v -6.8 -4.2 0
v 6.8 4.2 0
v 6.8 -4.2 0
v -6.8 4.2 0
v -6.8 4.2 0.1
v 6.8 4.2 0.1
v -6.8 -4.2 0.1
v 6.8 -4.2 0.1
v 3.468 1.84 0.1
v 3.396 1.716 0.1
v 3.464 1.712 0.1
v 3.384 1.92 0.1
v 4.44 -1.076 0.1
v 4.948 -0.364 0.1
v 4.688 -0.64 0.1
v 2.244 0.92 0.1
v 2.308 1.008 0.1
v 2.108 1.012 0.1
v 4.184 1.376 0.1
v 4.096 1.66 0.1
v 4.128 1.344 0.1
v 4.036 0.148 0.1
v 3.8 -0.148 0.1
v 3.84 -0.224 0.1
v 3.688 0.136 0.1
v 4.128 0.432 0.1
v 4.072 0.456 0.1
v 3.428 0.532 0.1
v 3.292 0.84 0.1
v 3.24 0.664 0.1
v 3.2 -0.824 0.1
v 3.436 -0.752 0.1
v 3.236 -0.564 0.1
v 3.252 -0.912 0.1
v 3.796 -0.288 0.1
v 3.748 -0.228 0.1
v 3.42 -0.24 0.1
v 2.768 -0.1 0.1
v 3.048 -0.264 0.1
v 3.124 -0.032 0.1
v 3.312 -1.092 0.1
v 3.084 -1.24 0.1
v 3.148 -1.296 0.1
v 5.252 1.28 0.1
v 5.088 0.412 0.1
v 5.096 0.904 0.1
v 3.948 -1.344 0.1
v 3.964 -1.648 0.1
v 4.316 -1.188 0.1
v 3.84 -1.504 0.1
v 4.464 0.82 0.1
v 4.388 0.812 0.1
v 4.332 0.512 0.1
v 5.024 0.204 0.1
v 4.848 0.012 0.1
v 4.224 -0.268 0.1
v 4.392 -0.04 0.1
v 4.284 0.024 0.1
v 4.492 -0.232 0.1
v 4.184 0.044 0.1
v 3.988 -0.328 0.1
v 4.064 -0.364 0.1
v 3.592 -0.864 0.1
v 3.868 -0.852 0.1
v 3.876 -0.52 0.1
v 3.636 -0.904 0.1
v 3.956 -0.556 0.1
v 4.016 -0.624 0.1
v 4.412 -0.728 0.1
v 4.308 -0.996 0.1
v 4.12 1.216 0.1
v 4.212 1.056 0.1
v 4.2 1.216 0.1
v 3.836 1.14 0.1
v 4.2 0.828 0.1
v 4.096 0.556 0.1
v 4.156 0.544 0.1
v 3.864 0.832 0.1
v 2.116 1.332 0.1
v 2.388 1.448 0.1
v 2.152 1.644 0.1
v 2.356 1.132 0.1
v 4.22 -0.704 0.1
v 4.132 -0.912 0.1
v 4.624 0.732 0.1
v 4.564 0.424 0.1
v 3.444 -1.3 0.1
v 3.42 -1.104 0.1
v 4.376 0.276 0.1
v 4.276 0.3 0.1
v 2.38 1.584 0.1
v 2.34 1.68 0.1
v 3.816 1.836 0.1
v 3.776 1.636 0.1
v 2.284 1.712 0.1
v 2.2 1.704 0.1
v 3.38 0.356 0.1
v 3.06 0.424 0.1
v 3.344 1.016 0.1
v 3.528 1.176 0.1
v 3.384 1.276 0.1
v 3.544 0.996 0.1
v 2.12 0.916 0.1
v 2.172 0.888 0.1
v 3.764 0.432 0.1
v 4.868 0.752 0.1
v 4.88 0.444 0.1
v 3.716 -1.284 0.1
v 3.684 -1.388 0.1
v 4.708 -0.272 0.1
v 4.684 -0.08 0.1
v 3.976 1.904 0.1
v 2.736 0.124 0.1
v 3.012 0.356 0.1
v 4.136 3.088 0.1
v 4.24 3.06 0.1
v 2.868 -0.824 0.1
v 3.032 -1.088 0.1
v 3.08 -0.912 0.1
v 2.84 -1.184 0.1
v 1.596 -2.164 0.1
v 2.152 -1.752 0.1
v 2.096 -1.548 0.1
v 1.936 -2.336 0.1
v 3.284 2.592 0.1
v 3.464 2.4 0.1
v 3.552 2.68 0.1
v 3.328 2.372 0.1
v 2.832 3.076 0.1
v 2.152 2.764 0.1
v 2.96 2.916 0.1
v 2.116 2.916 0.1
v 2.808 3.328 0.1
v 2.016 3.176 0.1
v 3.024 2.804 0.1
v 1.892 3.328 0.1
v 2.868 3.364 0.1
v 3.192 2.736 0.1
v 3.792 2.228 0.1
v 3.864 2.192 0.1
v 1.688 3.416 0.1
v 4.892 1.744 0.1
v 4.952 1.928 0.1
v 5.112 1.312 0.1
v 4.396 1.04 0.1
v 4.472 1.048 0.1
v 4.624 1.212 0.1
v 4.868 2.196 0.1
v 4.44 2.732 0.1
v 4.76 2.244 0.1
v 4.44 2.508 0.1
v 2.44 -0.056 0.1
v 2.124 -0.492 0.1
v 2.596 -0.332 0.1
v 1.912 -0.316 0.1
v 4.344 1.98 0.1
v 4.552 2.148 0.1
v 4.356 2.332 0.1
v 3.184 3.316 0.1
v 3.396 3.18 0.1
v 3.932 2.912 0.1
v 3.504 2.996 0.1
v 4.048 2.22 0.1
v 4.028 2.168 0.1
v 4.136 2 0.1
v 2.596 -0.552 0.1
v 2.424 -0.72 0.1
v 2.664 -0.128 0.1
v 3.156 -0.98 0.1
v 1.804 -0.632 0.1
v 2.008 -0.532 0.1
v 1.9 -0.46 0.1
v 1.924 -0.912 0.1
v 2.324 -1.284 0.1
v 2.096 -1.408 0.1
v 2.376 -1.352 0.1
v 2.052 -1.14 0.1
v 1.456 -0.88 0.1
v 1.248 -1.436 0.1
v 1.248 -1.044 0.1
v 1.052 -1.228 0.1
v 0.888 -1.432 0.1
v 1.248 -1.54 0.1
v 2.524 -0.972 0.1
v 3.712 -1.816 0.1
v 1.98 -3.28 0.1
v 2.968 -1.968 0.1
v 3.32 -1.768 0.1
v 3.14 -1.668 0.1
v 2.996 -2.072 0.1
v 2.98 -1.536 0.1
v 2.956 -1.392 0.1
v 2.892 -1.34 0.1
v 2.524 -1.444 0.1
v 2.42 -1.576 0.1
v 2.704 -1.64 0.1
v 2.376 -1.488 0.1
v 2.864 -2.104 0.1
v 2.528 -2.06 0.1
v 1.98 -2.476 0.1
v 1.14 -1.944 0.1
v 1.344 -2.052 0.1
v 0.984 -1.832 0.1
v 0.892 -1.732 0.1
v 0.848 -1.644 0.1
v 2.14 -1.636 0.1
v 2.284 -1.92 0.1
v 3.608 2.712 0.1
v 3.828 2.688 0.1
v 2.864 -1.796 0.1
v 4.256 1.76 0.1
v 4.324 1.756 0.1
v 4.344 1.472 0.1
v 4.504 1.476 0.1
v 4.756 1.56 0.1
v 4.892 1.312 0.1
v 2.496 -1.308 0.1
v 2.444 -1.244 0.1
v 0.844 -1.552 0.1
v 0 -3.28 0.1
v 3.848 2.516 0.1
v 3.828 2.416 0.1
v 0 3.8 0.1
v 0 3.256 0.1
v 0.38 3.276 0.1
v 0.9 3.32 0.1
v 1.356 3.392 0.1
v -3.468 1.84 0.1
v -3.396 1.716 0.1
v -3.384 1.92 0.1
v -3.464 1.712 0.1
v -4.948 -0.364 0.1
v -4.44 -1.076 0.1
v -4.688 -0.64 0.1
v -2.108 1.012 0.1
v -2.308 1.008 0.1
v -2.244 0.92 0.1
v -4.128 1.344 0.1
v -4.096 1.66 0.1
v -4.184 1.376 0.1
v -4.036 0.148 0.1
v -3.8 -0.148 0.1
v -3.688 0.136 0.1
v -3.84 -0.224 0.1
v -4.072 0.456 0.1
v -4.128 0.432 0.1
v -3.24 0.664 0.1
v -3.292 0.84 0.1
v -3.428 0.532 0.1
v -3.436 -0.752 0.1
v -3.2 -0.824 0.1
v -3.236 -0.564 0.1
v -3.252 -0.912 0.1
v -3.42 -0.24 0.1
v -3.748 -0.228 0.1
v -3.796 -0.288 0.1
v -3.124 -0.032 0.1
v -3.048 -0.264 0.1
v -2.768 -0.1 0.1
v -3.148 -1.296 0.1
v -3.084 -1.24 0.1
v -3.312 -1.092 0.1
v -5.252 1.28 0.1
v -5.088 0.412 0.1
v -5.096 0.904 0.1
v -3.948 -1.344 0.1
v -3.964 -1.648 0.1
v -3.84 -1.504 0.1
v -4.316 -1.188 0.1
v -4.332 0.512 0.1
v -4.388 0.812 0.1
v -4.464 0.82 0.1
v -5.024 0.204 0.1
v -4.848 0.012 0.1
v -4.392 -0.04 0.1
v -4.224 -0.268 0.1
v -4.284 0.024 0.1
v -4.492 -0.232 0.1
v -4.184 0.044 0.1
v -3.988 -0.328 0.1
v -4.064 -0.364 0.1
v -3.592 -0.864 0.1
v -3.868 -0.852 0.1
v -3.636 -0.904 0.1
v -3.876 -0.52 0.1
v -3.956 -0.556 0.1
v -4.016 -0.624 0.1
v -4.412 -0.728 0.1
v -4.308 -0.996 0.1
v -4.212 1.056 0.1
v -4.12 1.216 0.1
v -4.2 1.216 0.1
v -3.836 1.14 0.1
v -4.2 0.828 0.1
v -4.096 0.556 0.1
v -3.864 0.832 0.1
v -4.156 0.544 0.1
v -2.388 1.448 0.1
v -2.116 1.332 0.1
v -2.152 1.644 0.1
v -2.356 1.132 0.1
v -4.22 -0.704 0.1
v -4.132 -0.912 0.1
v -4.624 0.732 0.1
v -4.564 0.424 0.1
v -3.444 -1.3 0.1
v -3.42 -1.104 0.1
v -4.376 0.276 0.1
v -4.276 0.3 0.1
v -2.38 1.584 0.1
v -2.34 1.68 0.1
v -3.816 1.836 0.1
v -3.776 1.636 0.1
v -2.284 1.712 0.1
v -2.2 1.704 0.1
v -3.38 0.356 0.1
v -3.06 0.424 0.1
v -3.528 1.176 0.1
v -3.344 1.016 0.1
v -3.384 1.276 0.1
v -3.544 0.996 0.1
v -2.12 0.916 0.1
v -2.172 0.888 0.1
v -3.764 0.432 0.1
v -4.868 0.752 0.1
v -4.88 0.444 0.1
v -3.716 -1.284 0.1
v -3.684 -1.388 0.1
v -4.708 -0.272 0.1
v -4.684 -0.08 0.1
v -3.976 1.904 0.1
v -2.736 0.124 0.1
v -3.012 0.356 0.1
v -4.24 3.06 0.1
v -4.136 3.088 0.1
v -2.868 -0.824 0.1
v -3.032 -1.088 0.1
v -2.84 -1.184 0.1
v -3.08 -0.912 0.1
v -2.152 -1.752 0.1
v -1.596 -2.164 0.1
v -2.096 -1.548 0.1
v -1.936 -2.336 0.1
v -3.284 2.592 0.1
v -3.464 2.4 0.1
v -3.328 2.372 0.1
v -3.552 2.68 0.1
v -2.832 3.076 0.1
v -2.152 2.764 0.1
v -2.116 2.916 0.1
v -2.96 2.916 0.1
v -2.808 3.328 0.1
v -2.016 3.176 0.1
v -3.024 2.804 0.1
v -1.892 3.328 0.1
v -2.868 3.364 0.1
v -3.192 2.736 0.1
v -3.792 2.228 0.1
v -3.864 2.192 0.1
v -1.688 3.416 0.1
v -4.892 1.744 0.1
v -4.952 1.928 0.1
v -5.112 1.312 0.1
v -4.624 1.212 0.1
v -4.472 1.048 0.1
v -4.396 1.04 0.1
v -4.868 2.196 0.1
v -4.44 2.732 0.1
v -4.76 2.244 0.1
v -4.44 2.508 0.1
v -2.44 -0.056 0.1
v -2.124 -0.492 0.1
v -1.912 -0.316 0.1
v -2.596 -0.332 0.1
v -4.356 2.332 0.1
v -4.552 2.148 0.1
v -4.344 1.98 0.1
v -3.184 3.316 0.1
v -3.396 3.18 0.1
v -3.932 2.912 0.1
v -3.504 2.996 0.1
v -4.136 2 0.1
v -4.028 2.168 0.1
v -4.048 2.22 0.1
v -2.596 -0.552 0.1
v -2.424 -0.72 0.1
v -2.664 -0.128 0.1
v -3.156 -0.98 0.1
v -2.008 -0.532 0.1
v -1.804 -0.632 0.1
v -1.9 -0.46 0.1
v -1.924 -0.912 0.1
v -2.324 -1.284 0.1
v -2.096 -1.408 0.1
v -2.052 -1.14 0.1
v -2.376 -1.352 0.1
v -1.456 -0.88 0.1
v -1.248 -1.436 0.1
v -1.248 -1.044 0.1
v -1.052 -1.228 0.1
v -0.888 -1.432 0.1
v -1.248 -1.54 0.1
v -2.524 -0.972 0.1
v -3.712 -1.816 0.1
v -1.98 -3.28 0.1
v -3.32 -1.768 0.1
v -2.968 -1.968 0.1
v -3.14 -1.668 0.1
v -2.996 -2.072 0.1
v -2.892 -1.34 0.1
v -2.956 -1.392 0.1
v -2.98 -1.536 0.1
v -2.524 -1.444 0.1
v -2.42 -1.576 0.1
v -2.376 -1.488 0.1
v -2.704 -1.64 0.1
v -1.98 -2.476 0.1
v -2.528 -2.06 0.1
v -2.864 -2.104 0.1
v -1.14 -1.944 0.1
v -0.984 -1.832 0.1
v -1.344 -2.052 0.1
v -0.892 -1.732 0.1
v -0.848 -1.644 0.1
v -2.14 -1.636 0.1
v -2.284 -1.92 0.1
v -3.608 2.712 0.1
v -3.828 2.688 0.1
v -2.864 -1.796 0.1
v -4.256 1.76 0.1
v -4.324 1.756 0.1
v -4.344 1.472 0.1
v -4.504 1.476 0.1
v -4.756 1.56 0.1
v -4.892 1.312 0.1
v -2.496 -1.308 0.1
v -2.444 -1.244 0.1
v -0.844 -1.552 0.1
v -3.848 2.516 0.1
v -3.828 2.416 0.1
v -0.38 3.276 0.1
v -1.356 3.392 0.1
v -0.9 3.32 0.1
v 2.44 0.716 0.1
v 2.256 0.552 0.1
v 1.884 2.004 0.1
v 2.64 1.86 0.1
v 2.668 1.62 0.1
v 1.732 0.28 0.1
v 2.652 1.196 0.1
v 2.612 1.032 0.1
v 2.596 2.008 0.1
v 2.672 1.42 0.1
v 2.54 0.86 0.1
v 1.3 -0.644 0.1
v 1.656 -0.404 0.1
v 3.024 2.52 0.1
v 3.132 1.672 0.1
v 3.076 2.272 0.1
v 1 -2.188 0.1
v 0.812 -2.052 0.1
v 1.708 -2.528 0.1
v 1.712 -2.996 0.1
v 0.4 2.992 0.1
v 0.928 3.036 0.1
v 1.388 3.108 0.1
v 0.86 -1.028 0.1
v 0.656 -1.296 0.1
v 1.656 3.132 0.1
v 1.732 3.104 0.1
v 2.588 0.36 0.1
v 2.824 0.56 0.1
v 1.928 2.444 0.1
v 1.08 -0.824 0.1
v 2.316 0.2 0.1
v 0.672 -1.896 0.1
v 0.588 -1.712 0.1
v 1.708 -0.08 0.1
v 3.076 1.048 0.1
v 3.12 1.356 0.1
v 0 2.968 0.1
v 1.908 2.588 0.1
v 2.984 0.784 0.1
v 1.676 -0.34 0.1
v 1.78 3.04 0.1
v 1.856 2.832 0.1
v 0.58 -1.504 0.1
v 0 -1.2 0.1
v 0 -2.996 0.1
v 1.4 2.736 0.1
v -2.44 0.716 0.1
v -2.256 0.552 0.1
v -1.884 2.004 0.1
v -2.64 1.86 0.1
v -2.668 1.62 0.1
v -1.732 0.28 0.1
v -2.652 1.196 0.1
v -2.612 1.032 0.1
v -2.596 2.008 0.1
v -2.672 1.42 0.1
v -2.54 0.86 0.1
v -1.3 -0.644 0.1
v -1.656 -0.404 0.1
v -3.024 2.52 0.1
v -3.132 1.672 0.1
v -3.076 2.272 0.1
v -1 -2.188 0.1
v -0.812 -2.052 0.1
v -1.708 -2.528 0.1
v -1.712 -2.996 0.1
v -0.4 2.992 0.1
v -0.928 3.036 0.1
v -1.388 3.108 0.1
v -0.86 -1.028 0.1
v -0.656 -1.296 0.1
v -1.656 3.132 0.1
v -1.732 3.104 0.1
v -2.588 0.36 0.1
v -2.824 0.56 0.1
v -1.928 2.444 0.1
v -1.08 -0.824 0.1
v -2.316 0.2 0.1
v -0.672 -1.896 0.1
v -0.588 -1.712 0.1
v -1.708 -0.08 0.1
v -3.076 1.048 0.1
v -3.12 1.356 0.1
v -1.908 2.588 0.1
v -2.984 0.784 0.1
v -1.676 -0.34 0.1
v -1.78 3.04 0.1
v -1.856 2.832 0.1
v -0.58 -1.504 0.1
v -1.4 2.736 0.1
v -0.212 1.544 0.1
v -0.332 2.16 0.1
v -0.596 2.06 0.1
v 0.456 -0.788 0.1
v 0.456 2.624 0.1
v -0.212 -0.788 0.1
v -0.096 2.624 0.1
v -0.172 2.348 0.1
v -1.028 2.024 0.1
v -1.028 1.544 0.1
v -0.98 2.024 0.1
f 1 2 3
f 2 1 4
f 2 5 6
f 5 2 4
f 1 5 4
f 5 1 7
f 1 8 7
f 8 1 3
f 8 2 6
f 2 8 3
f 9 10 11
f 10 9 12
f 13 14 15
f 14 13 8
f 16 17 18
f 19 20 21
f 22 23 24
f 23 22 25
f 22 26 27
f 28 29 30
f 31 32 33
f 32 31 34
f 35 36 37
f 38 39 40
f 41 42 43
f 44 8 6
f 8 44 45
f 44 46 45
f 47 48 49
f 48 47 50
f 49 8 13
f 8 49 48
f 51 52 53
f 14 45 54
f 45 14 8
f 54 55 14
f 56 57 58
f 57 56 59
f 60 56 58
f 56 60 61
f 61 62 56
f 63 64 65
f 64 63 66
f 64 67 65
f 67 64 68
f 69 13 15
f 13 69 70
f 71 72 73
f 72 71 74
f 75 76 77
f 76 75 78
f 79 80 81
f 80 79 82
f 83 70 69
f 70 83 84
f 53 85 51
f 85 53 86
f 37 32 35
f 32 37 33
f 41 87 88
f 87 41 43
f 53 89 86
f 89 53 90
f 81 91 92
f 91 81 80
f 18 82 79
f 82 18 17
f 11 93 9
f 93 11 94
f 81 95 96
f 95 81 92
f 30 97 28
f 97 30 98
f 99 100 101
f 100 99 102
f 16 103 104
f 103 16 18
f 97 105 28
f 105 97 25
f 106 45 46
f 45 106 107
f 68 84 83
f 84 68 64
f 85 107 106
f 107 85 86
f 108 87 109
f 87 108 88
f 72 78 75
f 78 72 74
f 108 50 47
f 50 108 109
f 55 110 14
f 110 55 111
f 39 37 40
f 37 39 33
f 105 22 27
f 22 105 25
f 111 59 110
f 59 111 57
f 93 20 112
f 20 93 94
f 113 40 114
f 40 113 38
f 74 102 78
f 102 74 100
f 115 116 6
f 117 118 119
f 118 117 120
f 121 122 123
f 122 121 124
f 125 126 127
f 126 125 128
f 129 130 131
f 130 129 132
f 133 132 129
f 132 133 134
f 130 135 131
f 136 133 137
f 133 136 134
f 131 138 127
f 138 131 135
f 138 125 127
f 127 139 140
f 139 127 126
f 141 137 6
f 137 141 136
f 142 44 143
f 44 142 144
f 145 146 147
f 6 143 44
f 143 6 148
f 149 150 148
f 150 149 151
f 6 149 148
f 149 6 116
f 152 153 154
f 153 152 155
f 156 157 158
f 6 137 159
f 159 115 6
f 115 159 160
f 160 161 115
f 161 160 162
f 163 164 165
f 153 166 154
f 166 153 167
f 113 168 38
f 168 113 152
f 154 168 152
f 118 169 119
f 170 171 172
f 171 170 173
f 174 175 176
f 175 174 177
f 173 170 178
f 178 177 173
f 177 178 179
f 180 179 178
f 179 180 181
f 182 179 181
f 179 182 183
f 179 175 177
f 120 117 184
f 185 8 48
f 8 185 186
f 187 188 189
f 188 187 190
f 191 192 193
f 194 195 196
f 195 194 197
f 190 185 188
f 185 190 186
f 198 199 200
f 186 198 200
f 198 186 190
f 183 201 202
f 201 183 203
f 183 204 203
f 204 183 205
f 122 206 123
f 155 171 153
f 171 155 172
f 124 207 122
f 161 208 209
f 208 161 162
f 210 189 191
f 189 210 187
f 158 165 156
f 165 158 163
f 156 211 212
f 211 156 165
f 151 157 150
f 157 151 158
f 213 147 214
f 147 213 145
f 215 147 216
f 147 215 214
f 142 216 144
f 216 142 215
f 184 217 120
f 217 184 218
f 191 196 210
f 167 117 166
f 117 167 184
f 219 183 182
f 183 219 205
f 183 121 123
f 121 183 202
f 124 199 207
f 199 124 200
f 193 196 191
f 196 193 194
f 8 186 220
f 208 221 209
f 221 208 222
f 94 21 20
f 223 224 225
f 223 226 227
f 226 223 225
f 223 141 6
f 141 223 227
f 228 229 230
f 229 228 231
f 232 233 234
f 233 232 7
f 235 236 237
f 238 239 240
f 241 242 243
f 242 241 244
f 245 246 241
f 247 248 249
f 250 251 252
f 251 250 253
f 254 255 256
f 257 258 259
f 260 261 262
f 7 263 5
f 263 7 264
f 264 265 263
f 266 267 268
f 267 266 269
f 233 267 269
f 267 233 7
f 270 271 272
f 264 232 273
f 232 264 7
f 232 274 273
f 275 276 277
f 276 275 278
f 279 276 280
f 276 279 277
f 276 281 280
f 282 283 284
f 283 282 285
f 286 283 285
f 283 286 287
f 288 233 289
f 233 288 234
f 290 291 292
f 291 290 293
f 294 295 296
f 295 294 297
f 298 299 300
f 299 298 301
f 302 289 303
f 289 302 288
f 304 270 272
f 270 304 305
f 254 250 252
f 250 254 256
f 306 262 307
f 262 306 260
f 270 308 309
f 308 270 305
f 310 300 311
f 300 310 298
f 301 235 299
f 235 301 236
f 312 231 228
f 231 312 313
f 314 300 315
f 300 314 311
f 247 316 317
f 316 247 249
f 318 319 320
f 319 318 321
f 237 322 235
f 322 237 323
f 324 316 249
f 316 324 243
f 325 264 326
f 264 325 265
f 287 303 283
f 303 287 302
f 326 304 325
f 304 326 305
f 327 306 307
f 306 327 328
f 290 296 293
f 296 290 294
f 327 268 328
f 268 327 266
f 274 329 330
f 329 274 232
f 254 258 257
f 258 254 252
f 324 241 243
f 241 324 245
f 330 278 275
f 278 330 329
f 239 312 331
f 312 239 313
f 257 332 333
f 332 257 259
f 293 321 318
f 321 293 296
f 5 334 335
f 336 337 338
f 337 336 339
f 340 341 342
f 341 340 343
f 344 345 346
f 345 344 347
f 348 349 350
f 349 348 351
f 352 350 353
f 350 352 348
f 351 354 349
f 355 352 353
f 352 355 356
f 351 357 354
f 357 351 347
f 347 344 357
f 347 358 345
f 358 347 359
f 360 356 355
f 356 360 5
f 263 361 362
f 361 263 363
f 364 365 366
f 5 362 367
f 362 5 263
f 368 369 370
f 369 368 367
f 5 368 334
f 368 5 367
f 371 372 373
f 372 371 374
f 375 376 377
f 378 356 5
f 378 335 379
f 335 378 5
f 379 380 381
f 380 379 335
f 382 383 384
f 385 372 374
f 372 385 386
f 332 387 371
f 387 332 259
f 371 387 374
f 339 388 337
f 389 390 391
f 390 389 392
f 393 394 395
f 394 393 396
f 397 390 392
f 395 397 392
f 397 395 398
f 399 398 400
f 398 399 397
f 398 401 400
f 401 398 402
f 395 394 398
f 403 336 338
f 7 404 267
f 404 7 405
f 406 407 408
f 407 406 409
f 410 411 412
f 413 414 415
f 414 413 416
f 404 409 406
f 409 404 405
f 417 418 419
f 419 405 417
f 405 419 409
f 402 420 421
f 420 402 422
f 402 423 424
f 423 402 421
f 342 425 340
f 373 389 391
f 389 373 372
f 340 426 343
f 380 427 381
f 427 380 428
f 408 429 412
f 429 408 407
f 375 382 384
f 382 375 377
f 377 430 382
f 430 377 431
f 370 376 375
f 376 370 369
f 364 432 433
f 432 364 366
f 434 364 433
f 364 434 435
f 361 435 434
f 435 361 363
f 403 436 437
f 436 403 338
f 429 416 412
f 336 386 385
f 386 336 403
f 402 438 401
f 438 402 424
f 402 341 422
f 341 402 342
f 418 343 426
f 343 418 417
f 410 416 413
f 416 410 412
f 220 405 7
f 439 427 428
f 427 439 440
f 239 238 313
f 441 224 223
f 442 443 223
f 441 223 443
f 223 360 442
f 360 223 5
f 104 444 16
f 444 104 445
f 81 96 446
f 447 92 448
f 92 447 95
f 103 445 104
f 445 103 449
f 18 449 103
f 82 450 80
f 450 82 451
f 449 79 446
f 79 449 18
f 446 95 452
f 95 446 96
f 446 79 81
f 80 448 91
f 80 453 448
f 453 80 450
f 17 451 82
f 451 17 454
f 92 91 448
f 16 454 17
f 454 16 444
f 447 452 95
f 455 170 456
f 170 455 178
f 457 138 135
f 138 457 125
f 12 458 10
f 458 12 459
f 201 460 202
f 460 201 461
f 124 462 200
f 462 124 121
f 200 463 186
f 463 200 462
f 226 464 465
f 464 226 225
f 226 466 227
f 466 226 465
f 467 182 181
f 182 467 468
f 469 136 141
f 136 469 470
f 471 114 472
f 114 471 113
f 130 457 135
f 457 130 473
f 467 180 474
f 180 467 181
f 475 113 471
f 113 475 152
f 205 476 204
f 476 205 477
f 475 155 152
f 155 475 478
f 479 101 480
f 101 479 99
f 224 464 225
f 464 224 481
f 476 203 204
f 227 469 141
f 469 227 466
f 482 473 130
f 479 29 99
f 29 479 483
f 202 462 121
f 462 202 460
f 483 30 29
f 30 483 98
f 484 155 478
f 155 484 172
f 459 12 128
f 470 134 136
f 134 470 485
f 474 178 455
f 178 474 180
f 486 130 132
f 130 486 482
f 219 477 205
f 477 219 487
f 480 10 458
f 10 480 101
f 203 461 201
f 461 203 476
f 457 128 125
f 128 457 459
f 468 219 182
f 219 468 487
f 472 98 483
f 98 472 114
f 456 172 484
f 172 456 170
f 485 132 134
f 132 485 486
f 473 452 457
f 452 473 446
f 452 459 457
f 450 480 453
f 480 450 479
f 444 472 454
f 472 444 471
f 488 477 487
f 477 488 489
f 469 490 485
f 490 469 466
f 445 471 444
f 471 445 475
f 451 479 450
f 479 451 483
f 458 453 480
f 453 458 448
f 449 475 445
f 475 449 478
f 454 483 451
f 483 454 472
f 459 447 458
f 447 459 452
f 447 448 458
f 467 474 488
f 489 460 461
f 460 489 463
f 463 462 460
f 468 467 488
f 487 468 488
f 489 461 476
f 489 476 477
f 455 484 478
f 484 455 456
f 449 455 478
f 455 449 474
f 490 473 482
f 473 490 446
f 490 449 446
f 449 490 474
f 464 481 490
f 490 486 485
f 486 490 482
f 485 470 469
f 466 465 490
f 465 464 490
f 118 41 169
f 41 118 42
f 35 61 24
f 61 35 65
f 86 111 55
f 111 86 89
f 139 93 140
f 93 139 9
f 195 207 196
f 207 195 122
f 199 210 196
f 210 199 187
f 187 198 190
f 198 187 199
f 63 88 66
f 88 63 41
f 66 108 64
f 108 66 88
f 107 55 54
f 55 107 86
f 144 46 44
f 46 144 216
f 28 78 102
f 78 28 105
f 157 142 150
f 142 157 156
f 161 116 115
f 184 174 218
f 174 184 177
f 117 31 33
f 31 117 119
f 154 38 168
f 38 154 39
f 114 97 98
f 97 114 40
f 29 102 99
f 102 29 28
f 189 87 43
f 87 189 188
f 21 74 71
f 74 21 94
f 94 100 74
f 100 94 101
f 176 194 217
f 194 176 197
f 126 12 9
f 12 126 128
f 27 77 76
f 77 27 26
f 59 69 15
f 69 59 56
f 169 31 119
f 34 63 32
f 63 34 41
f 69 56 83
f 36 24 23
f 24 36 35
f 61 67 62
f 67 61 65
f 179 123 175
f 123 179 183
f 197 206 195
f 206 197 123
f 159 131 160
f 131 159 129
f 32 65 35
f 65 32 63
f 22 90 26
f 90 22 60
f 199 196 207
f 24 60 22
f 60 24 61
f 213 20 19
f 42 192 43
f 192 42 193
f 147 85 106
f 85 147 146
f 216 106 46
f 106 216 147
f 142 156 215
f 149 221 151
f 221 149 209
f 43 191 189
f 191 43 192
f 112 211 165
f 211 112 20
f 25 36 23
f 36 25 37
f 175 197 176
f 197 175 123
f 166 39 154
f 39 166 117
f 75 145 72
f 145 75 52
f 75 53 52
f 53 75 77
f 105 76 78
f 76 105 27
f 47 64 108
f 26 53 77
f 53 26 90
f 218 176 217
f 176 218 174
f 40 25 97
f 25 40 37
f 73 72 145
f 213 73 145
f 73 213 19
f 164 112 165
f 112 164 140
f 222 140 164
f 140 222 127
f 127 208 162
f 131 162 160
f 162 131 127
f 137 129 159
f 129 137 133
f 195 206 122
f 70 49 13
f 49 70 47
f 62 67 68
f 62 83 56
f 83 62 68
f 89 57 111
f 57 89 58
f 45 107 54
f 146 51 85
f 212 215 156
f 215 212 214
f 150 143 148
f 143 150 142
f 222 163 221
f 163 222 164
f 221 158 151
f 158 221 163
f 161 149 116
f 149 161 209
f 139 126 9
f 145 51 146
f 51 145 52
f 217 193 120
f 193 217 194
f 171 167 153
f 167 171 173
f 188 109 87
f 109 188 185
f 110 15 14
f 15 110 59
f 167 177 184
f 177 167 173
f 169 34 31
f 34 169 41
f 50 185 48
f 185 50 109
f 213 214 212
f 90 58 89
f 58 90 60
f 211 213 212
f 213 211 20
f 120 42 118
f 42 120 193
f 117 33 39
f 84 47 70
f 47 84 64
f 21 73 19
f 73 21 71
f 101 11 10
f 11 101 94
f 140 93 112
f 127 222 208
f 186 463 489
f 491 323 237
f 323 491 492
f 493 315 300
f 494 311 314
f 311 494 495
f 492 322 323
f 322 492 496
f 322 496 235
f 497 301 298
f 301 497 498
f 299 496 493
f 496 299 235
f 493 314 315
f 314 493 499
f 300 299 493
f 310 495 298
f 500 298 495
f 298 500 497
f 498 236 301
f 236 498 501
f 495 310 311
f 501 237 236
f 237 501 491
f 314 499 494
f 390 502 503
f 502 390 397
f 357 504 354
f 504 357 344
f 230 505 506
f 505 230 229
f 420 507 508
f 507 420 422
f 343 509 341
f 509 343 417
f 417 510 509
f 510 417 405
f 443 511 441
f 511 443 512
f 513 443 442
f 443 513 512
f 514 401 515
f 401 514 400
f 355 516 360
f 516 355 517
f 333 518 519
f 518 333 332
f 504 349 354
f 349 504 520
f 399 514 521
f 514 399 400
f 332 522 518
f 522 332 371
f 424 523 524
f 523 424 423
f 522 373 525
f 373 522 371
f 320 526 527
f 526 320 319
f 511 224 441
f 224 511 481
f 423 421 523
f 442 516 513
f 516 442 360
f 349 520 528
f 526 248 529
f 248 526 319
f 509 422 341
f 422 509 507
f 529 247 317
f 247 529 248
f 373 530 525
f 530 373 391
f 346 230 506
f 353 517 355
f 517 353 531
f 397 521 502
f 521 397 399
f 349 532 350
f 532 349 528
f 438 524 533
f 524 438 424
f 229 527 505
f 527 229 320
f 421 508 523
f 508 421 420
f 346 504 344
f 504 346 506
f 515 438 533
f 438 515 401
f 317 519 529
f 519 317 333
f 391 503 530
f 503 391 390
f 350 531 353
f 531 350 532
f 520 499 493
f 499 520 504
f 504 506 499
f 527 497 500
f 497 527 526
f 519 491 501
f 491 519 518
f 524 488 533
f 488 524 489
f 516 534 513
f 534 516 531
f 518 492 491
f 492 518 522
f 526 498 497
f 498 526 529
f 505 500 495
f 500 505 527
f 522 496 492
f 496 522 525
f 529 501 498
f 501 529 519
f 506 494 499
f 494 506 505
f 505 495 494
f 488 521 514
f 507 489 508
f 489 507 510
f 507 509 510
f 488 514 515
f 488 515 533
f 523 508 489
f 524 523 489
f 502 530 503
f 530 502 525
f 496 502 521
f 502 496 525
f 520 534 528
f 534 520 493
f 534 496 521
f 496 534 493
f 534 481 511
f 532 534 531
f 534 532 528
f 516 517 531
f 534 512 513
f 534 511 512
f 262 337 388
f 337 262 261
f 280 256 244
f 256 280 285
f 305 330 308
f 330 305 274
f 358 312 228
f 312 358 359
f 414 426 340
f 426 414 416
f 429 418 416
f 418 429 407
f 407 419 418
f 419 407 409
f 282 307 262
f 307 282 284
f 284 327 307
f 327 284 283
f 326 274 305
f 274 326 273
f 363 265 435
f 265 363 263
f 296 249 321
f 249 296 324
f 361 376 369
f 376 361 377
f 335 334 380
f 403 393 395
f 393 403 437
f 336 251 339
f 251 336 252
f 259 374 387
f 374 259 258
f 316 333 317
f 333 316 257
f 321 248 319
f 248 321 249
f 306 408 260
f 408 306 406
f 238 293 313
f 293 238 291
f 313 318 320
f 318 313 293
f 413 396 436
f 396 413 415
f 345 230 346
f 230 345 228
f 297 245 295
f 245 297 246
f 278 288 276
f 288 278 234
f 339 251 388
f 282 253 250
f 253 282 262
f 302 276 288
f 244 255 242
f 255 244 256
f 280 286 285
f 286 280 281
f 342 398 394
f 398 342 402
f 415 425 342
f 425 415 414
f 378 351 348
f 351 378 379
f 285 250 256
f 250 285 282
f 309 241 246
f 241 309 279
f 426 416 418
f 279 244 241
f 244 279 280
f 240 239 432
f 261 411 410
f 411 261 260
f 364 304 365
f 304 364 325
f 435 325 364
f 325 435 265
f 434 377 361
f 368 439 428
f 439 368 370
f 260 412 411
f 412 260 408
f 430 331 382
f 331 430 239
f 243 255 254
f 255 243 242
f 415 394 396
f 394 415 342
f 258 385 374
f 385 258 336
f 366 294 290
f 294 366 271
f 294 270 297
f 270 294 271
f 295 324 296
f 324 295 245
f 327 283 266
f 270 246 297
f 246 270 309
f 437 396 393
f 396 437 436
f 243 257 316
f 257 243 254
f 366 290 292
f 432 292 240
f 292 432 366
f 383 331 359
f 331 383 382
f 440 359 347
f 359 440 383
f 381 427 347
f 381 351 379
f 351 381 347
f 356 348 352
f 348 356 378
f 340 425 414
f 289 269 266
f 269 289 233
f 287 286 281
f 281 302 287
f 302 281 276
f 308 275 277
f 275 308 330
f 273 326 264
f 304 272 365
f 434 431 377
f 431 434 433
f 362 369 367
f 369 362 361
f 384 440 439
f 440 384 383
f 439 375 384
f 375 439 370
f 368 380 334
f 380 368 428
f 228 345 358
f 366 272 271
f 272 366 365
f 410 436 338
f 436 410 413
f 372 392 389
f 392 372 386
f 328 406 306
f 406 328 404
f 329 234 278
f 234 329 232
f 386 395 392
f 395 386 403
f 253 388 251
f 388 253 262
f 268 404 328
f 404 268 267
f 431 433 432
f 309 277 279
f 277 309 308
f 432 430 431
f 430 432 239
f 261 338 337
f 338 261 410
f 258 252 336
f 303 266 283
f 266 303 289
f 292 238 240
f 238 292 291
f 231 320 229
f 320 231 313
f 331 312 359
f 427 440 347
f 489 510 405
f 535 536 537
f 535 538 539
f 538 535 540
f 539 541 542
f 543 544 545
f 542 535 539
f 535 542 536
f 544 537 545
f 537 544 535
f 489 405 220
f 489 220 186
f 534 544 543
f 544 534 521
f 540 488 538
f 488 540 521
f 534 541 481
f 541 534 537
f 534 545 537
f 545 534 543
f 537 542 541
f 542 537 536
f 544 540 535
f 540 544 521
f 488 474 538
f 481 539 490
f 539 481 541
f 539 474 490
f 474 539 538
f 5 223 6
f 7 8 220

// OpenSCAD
// file: s/170877bs03.scad
use <../../lib.scad>
function ldraw_lib__s__170877bs03() = [
// 0 ~Sticker  1.1 x  1.7 with 1st Place Cup and Laurel Pattern - Number
// 0 Name: s\170877bs03.dat
// 0 Author: Max Seidenstücker [MaxSeidenstuecker]
// 0 !LDRAW_ORG Subpart UPDATE 2025-10
// 0 !LICENSE Licensed under CC BY 4.0 : see CAreadme.txt
// 
// 0 BFC CERTIFY CCW
  [0,"BFC","CERTIFY"],
  [0,"BFC","CCW"],
// 
// 0 !HISTORY 2025-10-27 [OrionP] Official Update 2025-10
// 
// 3 0 -.53 0 3.86 -.83 0 5.4 -1.49 0 5.15
  [3,0,-.53,0,3.86,-.83,0,5.4,-1.49,0,5.15],
// 4 0 1.14 0 6.56 -.53 0 3.86 -.53 0 -1.97 1.14 0 -1.97
  [4,0,1.14,0,6.56,-.53,0,3.86,-.53,0,-1.97,1.14,0,-1.97],
// 3 0 1.14 0 6.56 -.24 0 6.56 -.43 0 5.87
  [3,0,1.14,0,6.56,-.24,0,6.56,-.43,0,5.87],
// 3 0 -2.57 0 5.06 -2.57 0 3.86 -2.45 0 5.06
  [3,0,-2.57,0,5.06,-2.57,0,3.86,-2.45,0,5.06],
// 4 0 1.14 0 6.56 -.43 0 5.87 -.83 0 5.4 -.53 0 3.86
  [4,0,1.14,0,6.56,-.43,0,5.87,-.83,0,5.4,-.53,0,3.86],
// 4 0 -2.45 0 5.06 -2.57 0 3.86 -.53 0 3.86 -1.49 0 5.15
  [4,0,-2.45,0,5.06,-2.57,0,3.86,-.53,0,3.86,-1.49,0,5.15],
// 3 0 0 0 -7.49 -4.95 0 -8.2 0 0 -8.2
  [3,0,0,0,-7.49,-4.95,0,-8.2,0,0,-8.2],
// 3 0 0 0 -7.49 0 0 -8.2 4.95 0 -8.2
  [3,0,0,0,-7.49,0,0,-8.2,4.95,0,-8.2],
// 
// 4 14 -2.57 0 5.06 -3.5 0 6.84 -2.7 0 -2.06 -2.57 0 3.86
  [4,14,-2.57,0,5.06,-3.5,0,6.84,-2.7,0,-2.06,-2.57,0,3.86],
// 4 14 1.14 0 -1.97 -.53 0 -1.97 -2.7 0 -2.06 0 0 -3
  [4,14,1.14,0,-1.97,-.53,0,-1.97,-2.7,0,-2.06,0,0,-3],
// 4 14 -1.49 0 5.15 -.24 0 6.56 0 0 7.42 -3.5 0 6.84
  [4,14,-1.49,0,5.15,-.24,0,6.56,0,0,7.42,-3.5,0,6.84],
// 4 14 -2.57 0 5.06 -2.45 0 5.06 -1.49 0 5.15 -3.5 0 6.84
  [4,14,-2.57,0,5.06,-2.45,0,5.06,-1.49,0,5.15,-3.5,0,6.84],
// 4 14 -.83 0 5.4 -.43 0 5.87 -.24 0 6.56 -1.49 0 5.15
  [4,14,-.83,0,5.4,-.43,0,5.87,-.24,0,6.56,-1.49,0,5.15],
// 4 14 -2.7 0 -2.06 -.53 0 -1.97 -.53 0 3.86 -2.57 0 3.86
  [4,14,-2.7,0,-2.06,-.53,0,-1.97,-.53,0,3.86,-2.57,0,3.86],
// 3 14 0 0 -3 2.7 0 -2.06 1.14 0 -1.97
  [3,14,0,0,-3,2.7,0,-2.06,1.14,0,-1.97],
// 4 14 -.24 0 6.56 1.14 0 6.56 3.5 0 6.84 0 0 7.42
  [4,14,-.24,0,6.56,1.14,0,6.56,3.5,0,6.84,0,0,7.42],
// 4 14 3.5 0 6.84 1.14 0 6.56 1.14 0 -1.97 2.7 0 -2.06
  [4,14,3.5,0,6.84,1.14,0,6.56,1.14,0,-1.97,2.7,0,-2.06],
// 
// 3 16 -17 0 10.5 0 0 9.5 17 0 10.5
  [3,16,-17,0,10.5,0,0,9.5,17,0,10.5],
// 3 16 -17 0 -10.5 17 0 -10.5 0 0 -8.2
  [3,16,-17,0,-10.5,17,0,-10.5,0,0,-8.2],
];
module ldraw_lib__s__170877bs03(step=0, col=false, unit=2/5, alt=false, line=0.2, solid=!$preview)
    makepoly(ldraw_lib__s__170877bs03(), step=step, col=col, unit=unit, alt=alt, line=line, solid=solid);
ldraw_lib__s__170877bs03(line=0.2);
// file: ../p/box5-12.scad
use <../lib.scad>
function ldraw_lib__box5_12() = [
// 0 Box with 5 Faces without Any Edges
// 0 Name: box5-12.dat
// 0 Author: Chris Dee [cwdee]
// 0 !LDRAW_ORG Primitive UPDATE 2009-02
// 0 !LICENSE Licensed under CC BY 4.0 : see CAreadme.txt
// 
// 0 BFC CERTIFY CCW
  [0,"BFC","CERTIFY"],
  [0,"BFC","CCW"],
// 
// 0 !HISTORY 2009-09-03 [PTadmin] Official Update 2009-02
// 
// 
// 4 16 1 1 1 1 1 -1 -1 1 -1 -1 1 1
  [4,16,1,1,1,1,1,-1,-1,1,-1,-1,1,1],
// 4 16 -1 0 1 1 0 1 1 1 1 -1 1 1
  [4,16,-1,0,1,1,0,1,1,1,1,-1,1,1],
// 4 16 -1 0 -1 -1 0 1 -1 1 1 -1 1 -1
  [4,16,-1,0,-1,-1,0,1,-1,1,1,-1,1,-1],
// 4 16 1 0 -1 -1 0 -1 -1 1 -1 1 1 -1
  [4,16,1,0,-1,-1,0,-1,-1,1,-1,1,1,-1],
// 4 16 1 0 1 1 0 -1 1 1 -1 1 1 1
  [4,16,1,0,1,1,0,-1,1,1,-1,1,1,1],
// 0
];
module ldraw_lib__box5_12(step=0, col=false, unit=2/5, alt=false, line=0.2, solid=!$preview)
    makepoly(ldraw_lib__box5_12(), step=step, col=col, unit=unit, alt=alt, line=line, solid=solid);
ldraw_lib__box5_12(line=0.2);
// main file
use <../lib.scad>
use <../p/box5-12.scad>
use <s/170877bs01.scad>
use <s/170877bs02.scad>
use <s/170877bs03.scad>
function ldraw_lib__821435i() = [
// 0 Sticker  1.1 x  1.7 with Black Number "1" on Yellow Trophy Cup and Laurels on Transparent Background
// 0 Name: 821435i.dat
// 0 Author: Takeshi Takahashi [RainbowDolphin]
// 0 !LDRAW_ORG Part UPDATE 2025-10
// 0 !LICENSE Licensed under CC BY 4.0 : see CAreadme.txt
// 
// 0 BFC CERTIFY CCW
  [0,"BFC","CERTIFY"],
  [0,"BFC","CCW"],
// 
// 0 !KEYWORDS Bricklink 6539stk01, Racing, Rebrickable 821435, Set 6539
// 0 !KEYWORDS Victory cup racers
// 
// 0 !HISTORY 2025-10-27 [OrionP] Official Update 2025-10
// 
// 1 16 0 -0.25 0 17 0 0 0 0.25 0 0 0 10.5 box5-12.dat
  [1,16,0,-0.25,0,17,0,0,0,0.25,0,0,0,10.5, ldraw_lib__box5_12()],
// 1 16 0 -.25 0 1 0 0 0 1 0 0 0 1 s\170877bs02.dat
  [1,16,0,-.25,0,1,0,0,0,1,0,0,0,1, ldraw_lib__s__170877bs02()],
// 1 16 0 -.25 0 -1 0 0 0 1 0 0 0 1 s\170877bs02.dat
  [1,16,0,-.25,0,-1,0,0,0,1,0,0,0,1, ldraw_lib__s__170877bs02()],
// 0 BFC NOCLIP
  [0,"BFC","NOCLIP"],
// 1 16 0 -.25 0 1 0 0 0 1 0 0 0 1 s\170877bs01.dat
  [1,16,0,-.25,0,1,0,0,0,1,0,0,0,1, ldraw_lib__s__170877bs01()],
// 1 16 0 -.25 0 -1 0 0 0 1 0 0 0 1 s\170877bs01.dat
  [1,16,0,-.25,0,-1,0,0,0,1,0,0,0,1, ldraw_lib__s__170877bs01()],
// 1 16 0 -.25 0 1 0 0 0 1 0 0 0 1 s\170877bs03.dat
  [1,16,0,-.25,0,1,0,0,0,1,0,0,0,1, ldraw_lib__s__170877bs03()],
];
module ldraw_lib__821435i(step=0, col=false, unit=2/5, alt=false, line=0.2, solid=!$preview)
    makepoly(ldraw_lib__821435i(), step=step, col=col, unit=unit, alt=alt, line=line, solid=solid);
ldraw_lib__821435i(line=0.2);
